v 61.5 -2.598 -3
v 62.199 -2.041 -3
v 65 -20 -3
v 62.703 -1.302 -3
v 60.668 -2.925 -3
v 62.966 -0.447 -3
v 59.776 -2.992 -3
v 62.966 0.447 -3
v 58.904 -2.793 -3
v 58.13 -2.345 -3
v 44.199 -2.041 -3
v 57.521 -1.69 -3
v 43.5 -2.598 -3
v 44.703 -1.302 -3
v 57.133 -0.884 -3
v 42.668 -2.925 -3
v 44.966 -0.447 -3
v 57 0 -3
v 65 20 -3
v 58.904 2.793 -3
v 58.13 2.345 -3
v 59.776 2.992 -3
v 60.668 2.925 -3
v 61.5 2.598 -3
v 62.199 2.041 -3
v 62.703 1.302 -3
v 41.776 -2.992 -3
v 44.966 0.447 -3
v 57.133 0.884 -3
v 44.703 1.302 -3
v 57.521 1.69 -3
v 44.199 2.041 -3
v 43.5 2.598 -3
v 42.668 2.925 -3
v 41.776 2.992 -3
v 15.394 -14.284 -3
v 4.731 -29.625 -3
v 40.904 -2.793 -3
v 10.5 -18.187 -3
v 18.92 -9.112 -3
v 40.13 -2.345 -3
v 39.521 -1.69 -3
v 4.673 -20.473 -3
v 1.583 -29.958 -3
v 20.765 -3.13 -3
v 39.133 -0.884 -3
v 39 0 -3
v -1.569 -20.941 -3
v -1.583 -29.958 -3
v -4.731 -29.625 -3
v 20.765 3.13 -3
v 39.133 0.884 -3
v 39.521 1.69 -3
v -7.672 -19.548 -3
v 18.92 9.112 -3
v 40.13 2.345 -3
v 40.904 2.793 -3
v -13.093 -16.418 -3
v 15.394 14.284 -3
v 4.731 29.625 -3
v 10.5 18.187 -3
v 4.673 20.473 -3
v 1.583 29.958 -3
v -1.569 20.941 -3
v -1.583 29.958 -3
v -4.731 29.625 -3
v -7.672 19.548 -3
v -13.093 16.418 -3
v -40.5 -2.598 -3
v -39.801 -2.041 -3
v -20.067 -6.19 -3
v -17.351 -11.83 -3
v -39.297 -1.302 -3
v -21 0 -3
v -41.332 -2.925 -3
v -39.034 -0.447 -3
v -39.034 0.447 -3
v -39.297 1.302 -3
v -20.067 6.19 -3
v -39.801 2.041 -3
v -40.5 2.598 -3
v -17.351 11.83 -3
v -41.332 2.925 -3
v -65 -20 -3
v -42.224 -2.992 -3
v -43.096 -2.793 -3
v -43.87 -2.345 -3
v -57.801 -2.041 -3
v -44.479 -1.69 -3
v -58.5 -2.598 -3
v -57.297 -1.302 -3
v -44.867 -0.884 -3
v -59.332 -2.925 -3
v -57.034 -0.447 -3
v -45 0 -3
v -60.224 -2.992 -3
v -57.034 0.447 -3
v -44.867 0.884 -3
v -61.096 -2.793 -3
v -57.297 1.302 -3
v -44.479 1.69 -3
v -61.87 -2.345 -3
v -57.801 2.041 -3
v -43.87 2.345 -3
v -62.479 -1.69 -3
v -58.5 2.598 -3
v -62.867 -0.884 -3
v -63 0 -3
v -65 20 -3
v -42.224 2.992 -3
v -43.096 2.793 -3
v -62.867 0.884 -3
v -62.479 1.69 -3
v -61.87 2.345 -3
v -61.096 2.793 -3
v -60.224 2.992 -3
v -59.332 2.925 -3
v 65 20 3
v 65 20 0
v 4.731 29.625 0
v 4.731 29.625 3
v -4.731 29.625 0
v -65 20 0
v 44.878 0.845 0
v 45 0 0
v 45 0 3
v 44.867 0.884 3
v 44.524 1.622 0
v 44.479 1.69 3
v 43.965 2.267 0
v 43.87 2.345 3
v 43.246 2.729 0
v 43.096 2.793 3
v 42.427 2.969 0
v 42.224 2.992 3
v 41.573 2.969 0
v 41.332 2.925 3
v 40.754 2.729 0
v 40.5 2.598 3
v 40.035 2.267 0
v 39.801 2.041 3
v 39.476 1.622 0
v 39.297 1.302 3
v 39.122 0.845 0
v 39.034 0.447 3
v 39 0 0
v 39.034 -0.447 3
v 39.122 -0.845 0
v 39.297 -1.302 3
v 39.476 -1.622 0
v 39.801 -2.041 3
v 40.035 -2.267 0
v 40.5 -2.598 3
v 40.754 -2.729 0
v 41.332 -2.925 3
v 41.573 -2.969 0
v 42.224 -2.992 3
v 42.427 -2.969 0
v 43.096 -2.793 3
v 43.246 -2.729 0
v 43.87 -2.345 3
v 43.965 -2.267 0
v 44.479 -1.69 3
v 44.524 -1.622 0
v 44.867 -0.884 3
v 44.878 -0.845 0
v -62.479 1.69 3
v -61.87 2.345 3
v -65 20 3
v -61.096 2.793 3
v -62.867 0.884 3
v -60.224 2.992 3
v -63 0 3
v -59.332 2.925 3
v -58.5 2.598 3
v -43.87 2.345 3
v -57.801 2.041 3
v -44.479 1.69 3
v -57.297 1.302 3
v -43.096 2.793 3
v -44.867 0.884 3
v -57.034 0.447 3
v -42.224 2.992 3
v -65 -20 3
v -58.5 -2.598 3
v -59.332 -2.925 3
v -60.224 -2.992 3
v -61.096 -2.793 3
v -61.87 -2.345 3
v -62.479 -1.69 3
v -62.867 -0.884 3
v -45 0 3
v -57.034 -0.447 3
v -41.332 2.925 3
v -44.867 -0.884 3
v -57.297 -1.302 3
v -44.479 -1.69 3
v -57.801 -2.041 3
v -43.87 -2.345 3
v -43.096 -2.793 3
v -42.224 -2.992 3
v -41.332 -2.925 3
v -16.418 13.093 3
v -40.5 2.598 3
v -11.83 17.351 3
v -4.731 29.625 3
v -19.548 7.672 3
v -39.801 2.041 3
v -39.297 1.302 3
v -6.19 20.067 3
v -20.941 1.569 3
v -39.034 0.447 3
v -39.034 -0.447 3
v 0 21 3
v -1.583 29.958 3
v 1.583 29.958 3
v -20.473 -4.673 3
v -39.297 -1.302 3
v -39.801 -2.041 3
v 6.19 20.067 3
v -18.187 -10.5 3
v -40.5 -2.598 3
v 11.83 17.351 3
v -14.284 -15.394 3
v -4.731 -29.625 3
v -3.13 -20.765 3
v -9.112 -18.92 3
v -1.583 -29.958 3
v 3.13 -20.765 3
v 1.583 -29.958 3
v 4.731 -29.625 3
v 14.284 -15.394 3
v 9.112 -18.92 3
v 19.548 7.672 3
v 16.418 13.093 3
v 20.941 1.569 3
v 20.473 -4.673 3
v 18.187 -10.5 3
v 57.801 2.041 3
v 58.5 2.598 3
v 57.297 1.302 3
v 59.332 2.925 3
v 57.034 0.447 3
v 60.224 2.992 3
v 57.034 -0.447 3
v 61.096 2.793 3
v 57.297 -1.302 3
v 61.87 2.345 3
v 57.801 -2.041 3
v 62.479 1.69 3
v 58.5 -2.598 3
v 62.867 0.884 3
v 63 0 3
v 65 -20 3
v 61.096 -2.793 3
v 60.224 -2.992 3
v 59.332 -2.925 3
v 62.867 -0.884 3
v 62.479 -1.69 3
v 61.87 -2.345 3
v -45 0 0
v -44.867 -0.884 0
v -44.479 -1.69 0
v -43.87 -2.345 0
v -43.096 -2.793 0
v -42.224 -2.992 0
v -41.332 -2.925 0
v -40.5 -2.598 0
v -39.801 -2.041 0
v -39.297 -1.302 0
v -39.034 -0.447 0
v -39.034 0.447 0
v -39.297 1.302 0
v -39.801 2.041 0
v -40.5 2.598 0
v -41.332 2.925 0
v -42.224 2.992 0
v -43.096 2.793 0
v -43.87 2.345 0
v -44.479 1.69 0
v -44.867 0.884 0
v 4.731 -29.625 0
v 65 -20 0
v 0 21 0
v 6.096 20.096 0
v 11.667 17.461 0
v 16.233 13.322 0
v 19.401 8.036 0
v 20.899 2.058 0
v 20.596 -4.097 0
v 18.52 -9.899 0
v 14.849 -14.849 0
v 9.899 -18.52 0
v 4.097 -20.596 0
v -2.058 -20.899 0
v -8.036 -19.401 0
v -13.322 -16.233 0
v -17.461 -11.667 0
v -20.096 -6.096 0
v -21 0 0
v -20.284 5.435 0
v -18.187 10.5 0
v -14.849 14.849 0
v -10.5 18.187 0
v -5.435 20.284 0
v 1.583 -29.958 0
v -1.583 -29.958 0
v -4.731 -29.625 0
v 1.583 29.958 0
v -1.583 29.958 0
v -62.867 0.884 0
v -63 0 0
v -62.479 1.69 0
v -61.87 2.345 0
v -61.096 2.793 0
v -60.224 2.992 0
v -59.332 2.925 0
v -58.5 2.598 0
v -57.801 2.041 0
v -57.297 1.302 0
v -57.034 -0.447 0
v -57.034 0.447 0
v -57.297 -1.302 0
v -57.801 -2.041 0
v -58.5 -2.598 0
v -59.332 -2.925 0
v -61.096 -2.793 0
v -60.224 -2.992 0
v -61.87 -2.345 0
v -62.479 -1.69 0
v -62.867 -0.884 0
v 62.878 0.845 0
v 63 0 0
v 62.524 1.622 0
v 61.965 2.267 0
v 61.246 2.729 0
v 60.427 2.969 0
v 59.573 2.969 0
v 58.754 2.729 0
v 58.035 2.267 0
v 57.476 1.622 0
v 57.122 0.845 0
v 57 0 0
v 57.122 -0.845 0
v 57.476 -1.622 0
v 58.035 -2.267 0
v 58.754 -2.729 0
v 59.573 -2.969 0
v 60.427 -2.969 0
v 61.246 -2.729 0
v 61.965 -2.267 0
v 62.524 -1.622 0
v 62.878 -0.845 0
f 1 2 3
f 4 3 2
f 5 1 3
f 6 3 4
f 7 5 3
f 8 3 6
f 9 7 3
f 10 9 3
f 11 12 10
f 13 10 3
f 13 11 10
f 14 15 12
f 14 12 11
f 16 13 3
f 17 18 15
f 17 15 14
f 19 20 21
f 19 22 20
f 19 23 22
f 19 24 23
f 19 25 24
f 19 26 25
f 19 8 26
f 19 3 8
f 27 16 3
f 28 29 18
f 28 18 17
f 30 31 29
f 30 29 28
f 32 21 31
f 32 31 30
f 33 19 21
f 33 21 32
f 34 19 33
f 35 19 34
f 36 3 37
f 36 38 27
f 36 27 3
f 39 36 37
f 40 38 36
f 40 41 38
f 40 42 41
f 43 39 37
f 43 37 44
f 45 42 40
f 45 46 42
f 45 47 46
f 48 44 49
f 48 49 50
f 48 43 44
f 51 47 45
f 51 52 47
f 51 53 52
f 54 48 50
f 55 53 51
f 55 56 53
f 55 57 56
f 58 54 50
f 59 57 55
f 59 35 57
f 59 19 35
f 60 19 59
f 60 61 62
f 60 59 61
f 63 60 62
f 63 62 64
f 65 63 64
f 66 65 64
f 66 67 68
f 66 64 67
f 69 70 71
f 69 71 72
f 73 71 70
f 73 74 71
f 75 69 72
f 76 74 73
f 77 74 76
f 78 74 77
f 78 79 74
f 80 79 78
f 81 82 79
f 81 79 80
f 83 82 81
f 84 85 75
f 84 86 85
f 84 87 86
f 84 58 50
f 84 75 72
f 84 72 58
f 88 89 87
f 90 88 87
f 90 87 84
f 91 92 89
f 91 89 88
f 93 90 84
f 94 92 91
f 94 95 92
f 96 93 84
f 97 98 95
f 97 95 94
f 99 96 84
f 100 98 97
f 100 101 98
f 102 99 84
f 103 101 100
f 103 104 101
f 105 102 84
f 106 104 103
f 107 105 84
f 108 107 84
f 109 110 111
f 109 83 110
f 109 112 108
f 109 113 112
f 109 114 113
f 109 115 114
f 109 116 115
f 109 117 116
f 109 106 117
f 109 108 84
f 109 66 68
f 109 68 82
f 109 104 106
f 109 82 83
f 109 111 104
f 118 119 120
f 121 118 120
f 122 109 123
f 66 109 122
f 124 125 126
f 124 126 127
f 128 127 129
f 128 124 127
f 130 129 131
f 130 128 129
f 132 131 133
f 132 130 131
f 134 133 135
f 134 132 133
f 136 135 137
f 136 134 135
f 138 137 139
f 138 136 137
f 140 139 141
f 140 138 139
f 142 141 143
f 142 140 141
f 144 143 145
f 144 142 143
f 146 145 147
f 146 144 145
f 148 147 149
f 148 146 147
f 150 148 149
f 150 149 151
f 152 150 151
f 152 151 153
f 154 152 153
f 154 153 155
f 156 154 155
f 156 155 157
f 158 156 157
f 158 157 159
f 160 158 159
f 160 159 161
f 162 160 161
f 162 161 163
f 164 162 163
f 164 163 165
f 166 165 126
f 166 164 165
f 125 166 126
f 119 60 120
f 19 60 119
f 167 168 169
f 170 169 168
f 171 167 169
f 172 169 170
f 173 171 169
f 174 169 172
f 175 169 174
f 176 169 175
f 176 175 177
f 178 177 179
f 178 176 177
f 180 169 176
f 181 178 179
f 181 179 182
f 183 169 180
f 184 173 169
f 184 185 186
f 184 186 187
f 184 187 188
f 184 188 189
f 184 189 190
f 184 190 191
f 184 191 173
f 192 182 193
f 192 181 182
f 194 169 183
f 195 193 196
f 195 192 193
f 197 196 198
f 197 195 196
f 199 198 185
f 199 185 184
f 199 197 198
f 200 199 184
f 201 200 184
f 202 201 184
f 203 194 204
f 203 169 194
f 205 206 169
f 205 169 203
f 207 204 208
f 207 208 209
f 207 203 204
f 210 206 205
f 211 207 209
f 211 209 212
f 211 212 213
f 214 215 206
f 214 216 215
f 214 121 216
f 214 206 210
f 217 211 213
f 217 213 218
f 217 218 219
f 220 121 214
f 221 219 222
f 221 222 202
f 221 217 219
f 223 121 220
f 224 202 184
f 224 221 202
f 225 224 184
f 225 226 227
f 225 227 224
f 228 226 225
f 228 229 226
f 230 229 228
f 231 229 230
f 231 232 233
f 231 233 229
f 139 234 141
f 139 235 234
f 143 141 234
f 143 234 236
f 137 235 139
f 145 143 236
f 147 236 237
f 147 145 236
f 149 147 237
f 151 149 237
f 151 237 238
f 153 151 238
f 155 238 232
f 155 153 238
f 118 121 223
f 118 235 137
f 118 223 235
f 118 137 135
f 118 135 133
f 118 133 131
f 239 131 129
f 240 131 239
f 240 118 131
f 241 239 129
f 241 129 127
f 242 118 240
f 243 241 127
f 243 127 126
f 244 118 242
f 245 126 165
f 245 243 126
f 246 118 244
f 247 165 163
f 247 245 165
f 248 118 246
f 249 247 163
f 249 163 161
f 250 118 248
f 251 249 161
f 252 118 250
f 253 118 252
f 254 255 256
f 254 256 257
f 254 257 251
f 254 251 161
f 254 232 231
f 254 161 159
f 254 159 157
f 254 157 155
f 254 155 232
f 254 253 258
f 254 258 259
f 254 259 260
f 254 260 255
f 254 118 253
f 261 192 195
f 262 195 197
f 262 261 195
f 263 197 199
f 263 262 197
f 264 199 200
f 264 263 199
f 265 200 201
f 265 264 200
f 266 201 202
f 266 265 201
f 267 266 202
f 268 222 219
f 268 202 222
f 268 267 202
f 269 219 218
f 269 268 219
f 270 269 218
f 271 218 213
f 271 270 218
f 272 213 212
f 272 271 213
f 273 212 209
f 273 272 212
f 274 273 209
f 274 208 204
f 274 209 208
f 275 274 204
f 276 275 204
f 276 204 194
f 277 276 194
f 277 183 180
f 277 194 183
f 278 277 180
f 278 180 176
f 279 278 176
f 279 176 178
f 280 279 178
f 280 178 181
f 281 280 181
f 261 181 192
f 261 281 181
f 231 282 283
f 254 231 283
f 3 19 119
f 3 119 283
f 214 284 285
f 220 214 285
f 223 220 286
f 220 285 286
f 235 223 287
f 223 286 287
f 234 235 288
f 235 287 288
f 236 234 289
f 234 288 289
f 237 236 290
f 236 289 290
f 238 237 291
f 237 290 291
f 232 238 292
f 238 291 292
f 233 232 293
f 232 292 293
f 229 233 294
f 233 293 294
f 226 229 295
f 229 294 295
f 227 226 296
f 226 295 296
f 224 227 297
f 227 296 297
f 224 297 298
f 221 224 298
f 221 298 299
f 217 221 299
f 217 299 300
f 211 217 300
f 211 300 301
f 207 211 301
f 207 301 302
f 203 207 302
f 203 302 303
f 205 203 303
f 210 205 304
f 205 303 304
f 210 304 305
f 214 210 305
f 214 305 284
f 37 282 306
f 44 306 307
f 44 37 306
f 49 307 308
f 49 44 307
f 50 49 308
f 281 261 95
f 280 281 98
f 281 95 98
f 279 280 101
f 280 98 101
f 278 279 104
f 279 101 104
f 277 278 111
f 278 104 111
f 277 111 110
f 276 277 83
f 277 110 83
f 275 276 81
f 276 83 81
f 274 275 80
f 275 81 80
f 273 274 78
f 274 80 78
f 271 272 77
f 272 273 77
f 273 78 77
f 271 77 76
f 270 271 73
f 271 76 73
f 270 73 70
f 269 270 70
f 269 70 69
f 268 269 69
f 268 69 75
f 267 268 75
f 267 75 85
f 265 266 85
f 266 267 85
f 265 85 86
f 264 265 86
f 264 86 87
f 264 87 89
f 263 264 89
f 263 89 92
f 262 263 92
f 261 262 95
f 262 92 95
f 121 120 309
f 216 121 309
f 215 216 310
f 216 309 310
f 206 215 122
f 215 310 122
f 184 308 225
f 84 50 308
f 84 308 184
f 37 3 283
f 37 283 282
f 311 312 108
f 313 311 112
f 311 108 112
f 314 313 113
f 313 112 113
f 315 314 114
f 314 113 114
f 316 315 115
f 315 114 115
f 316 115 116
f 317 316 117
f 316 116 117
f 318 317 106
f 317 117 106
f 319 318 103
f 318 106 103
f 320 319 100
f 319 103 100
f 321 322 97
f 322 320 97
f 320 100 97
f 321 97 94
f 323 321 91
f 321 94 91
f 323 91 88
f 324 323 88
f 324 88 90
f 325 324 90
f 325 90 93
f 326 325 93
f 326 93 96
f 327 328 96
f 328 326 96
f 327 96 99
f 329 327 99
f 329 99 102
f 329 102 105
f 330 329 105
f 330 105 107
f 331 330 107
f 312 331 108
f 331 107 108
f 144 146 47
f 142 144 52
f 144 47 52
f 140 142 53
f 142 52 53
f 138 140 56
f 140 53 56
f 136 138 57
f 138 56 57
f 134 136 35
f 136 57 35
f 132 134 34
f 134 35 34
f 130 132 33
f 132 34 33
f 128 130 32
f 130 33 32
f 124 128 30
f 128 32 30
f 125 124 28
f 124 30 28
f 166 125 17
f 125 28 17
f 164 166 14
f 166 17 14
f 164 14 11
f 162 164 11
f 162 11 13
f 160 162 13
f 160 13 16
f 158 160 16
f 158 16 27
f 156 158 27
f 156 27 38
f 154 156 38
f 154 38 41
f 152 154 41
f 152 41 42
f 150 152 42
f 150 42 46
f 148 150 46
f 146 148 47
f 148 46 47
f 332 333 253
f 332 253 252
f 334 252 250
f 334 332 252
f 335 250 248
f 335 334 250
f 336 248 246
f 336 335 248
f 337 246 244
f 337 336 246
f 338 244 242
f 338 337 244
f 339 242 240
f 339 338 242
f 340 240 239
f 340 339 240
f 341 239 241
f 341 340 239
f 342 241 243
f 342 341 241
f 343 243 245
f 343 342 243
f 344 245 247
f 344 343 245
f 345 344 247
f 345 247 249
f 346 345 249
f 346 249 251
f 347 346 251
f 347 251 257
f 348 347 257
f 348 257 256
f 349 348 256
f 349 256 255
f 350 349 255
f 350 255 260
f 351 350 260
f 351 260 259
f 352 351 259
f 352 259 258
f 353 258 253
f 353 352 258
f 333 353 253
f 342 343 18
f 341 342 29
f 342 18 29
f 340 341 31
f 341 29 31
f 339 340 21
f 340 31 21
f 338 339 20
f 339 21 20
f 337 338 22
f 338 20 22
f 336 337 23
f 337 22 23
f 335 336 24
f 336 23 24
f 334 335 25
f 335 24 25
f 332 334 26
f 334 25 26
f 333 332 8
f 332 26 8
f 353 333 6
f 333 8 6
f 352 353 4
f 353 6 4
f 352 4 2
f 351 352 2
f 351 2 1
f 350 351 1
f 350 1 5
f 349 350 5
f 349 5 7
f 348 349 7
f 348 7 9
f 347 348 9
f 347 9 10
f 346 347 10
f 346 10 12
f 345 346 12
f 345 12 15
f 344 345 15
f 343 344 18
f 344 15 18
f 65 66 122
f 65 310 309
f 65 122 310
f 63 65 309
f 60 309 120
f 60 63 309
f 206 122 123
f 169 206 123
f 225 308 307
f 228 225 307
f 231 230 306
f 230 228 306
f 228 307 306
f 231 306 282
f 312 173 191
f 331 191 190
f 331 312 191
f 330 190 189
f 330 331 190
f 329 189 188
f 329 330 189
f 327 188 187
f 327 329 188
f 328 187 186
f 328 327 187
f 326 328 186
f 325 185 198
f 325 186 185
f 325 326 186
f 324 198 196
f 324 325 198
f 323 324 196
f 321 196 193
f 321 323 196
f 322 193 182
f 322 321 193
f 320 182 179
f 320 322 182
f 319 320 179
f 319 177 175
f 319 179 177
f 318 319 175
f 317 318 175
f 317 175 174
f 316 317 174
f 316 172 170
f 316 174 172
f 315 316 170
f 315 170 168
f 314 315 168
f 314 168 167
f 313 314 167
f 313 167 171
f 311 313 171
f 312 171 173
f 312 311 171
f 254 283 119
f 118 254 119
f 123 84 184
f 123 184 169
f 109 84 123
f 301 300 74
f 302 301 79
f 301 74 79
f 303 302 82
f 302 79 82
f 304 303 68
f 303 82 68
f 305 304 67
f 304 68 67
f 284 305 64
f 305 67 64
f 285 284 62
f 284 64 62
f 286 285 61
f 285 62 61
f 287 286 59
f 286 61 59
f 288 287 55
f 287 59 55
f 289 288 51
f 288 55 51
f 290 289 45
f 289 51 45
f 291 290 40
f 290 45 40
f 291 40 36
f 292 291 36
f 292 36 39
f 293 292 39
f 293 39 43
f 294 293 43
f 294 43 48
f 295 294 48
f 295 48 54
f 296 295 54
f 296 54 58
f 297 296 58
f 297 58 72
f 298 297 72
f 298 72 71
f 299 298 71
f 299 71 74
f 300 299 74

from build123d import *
from build123d.topology import SkipClean

# Parameters (mm, degrees)
SKETCH1_R           = 3.000000000000015
SKETCH1_R_2         = 3.0000000000000013
SKETCH1_R_3         = 3.0000000000000084
SKETCH1_R_4         = 16
BOSS_EXTRUDE1_DEPTH = 6
BOSS_EXTRUDE3_START = 3.5
SKETCH3_R           = 30.000000000000057
SKETCH3_R_2         = 21
BOSS_EXTRUDE3_DEPTH = 3.5
BOSS_EXTRUDE4_START = 3.5
SKETCH4_R           = 3.000000000000015
SKETCH4_R_2         = 3.0000000000000013
SKETCH4_R_3         = 3.0000000000000084
BOSS_EXTRUDE4_DEPTH = 3.5
SKETCH5_R           = 3.000000000000015
SKETCH5_R_2         = 3.0000000000000013
SKETCH5_R_3         = 21
SKETCH5_R_4         = 3.0000000000000084
CUT_EXTRUDE1_DEPTH  = 0.5
CUT_EXTRUDE2_DEPTH  = 182.00000000000009
SKETCH7_R           = 21
CUT_EXTRUDE3_DEPTH  = 10


with BuildPart() as part:
    # Sketch1 → Boss-Extrude1 (new body)
    with BuildSketch(Plane.XY):
        with BuildLine():
            Line((-65.00000000000001, 20), (-65, -20))
            Line((-65, -20), (-4.73088284384841, -29.624630757492685))
            ThreePointArc((-4.73088284384841, -29.624630757492685), (1.516e-14, -30.000000000000014), (4.7308828438484465, -29.624630757492678))
            Line((4.7308828438484465, -29.624630757492678), (65.00000000000003, -19.99999999999992))
            Line((65.00000000000003, -19.99999999999992), (65.00000000000001, 20))
            Line((65.00000000000001, 20), (4.730882843848428, 29.624630757492728))
            ThreePointArc((4.730882843848428, 29.624630757492728), (1.84e-15, 30.00000000000006), (-4.730882843848428, 29.624630757492728))
            Line((-4.730882843848428, 29.624630757492728), (-65.00000000000001, 20))
        make_face()
        with Locations((59.99999999998411, -4.545e-13)):
            Circle(SKETCH1_R, mode=Mode.SUBTRACT)
        with Locations((42, 0)):
            Circle(SKETCH1_R_2, mode=Mode.SUBTRACT)
        with Locations(Location((-59.99999999998411, -4.545e-13, 0), (0, 0, 180))):
            Circle(SKETCH1_R_3, mode=Mode.SUBTRACT)
        with Locations(Location((-42, 0, 0), (0, 0, 180))):
            Circle(SKETCH1_R_2, mode=Mode.SUBTRACT)
        Circle(SKETCH1_R_4, mode=Mode.SUBTRACT)
    extrude(amount=BOSS_EXTRUDE1_DEPTH)

    # Sketch3 → Boss-Extrude3 (add)
    with SkipClean():  # the faces are left unmerged after this step: merging them gives an invalid solid
        with BuildSketch(Plane(origin=(0, 0, 0), x_dir=(-1, 0, 0), z_dir=(0, 0, -1)).offset(BOSS_EXTRUDE3_START)):
            Circle(SKETCH3_R)
            Circle(SKETCH3_R_2, mode=Mode.SUBTRACT)
        extrude(amount=-BOSS_EXTRUDE3_DEPTH)

    # Sketch4 → Boss-Extrude4 (add)
    # profile 1 of 2: a face of its own
    with BuildSketch(Plane(origin=(0, 0, 0), x_dir=(-1, 0, 0), z_dir=(0, 0, -1)).offset(BOSS_EXTRUDE4_START)):
        with BuildLine():
            Line((4.730882843848405, -29.624630757492703), (65, -20))
            Line((65, -20), (65.00000000000001, 20))
            Line((65.00000000000001, 20), (4.730882843848438, 29.624630757492703))
            ThreePointArc((4.730882843848438, 29.624630757492703), (30.000000000000032, -1.998e-14), (4.730882843848405, -29.624630757492703))
        make_face()
        with Locations((59.99999999998411, -4.545e-13)):
            Circle(SKETCH4_R, mode=Mode.SUBTRACT)
        with Locations((42, 0)):
            Circle(SKETCH4_R_2, mode=Mode.SUBTRACT)
    # profile 2 of 2: a face of its own
    with BuildSketch(Plane(origin=(0, 0, 0), x_dir=(-1, 0, 0), z_dir=(0, 0, -1)).offset(BOSS_EXTRUDE4_START)):
        with BuildLine():
            Line((-4.730882843848428, 29.624630757492703), (-65.00000000000001, 20))
            Line((-65.00000000000001, 20), (-65.00000000000003, -19.99999999999992))
            Line((-65.00000000000003, -19.99999999999992), (-4.730882843848441, -29.624630757492703))
            ThreePointArc((-4.730882843848441, -29.624630757492703), (-30.000000000000036, 3.67e-15), (-4.730882843848428, 29.624630757492703))
        make_face()
        with Locations((-42, 0)):
            Circle(SKETCH4_R_2, mode=Mode.SUBTRACT)
        with Locations((-59.99999999998411, -4.545e-13)):
            Circle(SKETCH4_R_3, mode=Mode.SUBTRACT)
    extrude(amount=-BOSS_EXTRUDE4_DEPTH)

    # Sketch5 → Cut-Extrude1 (cut)
    with BuildSketch(Plane(origin=(0, 0, -3.5), x_dir=(-1, 0, 0), z_dir=(0, 0, -1))):
        with BuildLine():
            Line((-4.730882843848428, 29.624630757492703), (-65.00000000000001, 20))
            Line((-65.00000000000001, 20), (-65.00000000000003, -19.99999999999992))
            Line((-65.00000000000003, -19.99999999999992), (-4.73088284384847, -29.6246307574927))
            ThreePointArc((-4.73088284384847, -29.6246307574927), (-3.147e-14, -30.00000000000004), (4.730882843848405, -29.624630757492703))
            Line((4.730882843848405, -29.624630757492703), (65, -20))
            Line((65, -20), (65.00000000000001, 20))
            Line((65.00000000000001, 20), (4.730882843848431, 29.624630757492703))
            ThreePointArc((4.730882843848431, 29.624630757492703), (1.84e-15, 30.000000000000036), (-4.730882843848428, 29.624630757492703))
        make_face()
        with Locations((59.99999999998411, -4.545e-13)):
            Circle(SKETCH5_R, mode=Mode.SUBTRACT)
        with Locations((42, 0)):
            Circle(SKETCH5_R_2, mode=Mode.SUBTRACT)
        Circle(SKETCH5_R_3, mode=Mode.SUBTRACT)
        with Locations((-42, 0)):
            Circle(SKETCH5_R_2, mode=Mode.SUBTRACT)
        with Locations((-59.99999999998411, -4.545e-13)):
            Circle(SKETCH5_R_4, mode=Mode.SUBTRACT)
    extrude(amount=-CUT_EXTRUDE1_DEPTH, mode=Mode.SUBTRACT)

    # Sketch6 → Cut-Extrude2 (cut)
    with BuildSketch(Plane(origin=(65.00000000000003, 2.255e-14, 0), x_dir=(0, 0, -1), z_dir=(1, 3.5e-16, 0))):
        Polygon((-3, 36.68379412989912), (-2.999999999999992, -32.31620587010089), (-5.999999999999992, -32.31620587010089), (-6, 29.812315378746394), (-6, 36.68379412989912), align=None)
    extrude(amount=-CUT_EXTRUDE2_DEPTH, mode=Mode.SUBTRACT)

    # Sketch7 → Cut-Extrude3 (cut)
    with BuildSketch(Plane(origin=(0, 0, 0), x_dir=(-1, 0, 0), z_dir=(0, 0, -1))):
        with Locations(Location((0, 0, 0), (0, 0, 90))):
            Circle(SKETCH7_R)
    extrude(amount=-CUT_EXTRUDE3_DEPTH, mode=Mode.SUBTRACT)


solid = part.part
